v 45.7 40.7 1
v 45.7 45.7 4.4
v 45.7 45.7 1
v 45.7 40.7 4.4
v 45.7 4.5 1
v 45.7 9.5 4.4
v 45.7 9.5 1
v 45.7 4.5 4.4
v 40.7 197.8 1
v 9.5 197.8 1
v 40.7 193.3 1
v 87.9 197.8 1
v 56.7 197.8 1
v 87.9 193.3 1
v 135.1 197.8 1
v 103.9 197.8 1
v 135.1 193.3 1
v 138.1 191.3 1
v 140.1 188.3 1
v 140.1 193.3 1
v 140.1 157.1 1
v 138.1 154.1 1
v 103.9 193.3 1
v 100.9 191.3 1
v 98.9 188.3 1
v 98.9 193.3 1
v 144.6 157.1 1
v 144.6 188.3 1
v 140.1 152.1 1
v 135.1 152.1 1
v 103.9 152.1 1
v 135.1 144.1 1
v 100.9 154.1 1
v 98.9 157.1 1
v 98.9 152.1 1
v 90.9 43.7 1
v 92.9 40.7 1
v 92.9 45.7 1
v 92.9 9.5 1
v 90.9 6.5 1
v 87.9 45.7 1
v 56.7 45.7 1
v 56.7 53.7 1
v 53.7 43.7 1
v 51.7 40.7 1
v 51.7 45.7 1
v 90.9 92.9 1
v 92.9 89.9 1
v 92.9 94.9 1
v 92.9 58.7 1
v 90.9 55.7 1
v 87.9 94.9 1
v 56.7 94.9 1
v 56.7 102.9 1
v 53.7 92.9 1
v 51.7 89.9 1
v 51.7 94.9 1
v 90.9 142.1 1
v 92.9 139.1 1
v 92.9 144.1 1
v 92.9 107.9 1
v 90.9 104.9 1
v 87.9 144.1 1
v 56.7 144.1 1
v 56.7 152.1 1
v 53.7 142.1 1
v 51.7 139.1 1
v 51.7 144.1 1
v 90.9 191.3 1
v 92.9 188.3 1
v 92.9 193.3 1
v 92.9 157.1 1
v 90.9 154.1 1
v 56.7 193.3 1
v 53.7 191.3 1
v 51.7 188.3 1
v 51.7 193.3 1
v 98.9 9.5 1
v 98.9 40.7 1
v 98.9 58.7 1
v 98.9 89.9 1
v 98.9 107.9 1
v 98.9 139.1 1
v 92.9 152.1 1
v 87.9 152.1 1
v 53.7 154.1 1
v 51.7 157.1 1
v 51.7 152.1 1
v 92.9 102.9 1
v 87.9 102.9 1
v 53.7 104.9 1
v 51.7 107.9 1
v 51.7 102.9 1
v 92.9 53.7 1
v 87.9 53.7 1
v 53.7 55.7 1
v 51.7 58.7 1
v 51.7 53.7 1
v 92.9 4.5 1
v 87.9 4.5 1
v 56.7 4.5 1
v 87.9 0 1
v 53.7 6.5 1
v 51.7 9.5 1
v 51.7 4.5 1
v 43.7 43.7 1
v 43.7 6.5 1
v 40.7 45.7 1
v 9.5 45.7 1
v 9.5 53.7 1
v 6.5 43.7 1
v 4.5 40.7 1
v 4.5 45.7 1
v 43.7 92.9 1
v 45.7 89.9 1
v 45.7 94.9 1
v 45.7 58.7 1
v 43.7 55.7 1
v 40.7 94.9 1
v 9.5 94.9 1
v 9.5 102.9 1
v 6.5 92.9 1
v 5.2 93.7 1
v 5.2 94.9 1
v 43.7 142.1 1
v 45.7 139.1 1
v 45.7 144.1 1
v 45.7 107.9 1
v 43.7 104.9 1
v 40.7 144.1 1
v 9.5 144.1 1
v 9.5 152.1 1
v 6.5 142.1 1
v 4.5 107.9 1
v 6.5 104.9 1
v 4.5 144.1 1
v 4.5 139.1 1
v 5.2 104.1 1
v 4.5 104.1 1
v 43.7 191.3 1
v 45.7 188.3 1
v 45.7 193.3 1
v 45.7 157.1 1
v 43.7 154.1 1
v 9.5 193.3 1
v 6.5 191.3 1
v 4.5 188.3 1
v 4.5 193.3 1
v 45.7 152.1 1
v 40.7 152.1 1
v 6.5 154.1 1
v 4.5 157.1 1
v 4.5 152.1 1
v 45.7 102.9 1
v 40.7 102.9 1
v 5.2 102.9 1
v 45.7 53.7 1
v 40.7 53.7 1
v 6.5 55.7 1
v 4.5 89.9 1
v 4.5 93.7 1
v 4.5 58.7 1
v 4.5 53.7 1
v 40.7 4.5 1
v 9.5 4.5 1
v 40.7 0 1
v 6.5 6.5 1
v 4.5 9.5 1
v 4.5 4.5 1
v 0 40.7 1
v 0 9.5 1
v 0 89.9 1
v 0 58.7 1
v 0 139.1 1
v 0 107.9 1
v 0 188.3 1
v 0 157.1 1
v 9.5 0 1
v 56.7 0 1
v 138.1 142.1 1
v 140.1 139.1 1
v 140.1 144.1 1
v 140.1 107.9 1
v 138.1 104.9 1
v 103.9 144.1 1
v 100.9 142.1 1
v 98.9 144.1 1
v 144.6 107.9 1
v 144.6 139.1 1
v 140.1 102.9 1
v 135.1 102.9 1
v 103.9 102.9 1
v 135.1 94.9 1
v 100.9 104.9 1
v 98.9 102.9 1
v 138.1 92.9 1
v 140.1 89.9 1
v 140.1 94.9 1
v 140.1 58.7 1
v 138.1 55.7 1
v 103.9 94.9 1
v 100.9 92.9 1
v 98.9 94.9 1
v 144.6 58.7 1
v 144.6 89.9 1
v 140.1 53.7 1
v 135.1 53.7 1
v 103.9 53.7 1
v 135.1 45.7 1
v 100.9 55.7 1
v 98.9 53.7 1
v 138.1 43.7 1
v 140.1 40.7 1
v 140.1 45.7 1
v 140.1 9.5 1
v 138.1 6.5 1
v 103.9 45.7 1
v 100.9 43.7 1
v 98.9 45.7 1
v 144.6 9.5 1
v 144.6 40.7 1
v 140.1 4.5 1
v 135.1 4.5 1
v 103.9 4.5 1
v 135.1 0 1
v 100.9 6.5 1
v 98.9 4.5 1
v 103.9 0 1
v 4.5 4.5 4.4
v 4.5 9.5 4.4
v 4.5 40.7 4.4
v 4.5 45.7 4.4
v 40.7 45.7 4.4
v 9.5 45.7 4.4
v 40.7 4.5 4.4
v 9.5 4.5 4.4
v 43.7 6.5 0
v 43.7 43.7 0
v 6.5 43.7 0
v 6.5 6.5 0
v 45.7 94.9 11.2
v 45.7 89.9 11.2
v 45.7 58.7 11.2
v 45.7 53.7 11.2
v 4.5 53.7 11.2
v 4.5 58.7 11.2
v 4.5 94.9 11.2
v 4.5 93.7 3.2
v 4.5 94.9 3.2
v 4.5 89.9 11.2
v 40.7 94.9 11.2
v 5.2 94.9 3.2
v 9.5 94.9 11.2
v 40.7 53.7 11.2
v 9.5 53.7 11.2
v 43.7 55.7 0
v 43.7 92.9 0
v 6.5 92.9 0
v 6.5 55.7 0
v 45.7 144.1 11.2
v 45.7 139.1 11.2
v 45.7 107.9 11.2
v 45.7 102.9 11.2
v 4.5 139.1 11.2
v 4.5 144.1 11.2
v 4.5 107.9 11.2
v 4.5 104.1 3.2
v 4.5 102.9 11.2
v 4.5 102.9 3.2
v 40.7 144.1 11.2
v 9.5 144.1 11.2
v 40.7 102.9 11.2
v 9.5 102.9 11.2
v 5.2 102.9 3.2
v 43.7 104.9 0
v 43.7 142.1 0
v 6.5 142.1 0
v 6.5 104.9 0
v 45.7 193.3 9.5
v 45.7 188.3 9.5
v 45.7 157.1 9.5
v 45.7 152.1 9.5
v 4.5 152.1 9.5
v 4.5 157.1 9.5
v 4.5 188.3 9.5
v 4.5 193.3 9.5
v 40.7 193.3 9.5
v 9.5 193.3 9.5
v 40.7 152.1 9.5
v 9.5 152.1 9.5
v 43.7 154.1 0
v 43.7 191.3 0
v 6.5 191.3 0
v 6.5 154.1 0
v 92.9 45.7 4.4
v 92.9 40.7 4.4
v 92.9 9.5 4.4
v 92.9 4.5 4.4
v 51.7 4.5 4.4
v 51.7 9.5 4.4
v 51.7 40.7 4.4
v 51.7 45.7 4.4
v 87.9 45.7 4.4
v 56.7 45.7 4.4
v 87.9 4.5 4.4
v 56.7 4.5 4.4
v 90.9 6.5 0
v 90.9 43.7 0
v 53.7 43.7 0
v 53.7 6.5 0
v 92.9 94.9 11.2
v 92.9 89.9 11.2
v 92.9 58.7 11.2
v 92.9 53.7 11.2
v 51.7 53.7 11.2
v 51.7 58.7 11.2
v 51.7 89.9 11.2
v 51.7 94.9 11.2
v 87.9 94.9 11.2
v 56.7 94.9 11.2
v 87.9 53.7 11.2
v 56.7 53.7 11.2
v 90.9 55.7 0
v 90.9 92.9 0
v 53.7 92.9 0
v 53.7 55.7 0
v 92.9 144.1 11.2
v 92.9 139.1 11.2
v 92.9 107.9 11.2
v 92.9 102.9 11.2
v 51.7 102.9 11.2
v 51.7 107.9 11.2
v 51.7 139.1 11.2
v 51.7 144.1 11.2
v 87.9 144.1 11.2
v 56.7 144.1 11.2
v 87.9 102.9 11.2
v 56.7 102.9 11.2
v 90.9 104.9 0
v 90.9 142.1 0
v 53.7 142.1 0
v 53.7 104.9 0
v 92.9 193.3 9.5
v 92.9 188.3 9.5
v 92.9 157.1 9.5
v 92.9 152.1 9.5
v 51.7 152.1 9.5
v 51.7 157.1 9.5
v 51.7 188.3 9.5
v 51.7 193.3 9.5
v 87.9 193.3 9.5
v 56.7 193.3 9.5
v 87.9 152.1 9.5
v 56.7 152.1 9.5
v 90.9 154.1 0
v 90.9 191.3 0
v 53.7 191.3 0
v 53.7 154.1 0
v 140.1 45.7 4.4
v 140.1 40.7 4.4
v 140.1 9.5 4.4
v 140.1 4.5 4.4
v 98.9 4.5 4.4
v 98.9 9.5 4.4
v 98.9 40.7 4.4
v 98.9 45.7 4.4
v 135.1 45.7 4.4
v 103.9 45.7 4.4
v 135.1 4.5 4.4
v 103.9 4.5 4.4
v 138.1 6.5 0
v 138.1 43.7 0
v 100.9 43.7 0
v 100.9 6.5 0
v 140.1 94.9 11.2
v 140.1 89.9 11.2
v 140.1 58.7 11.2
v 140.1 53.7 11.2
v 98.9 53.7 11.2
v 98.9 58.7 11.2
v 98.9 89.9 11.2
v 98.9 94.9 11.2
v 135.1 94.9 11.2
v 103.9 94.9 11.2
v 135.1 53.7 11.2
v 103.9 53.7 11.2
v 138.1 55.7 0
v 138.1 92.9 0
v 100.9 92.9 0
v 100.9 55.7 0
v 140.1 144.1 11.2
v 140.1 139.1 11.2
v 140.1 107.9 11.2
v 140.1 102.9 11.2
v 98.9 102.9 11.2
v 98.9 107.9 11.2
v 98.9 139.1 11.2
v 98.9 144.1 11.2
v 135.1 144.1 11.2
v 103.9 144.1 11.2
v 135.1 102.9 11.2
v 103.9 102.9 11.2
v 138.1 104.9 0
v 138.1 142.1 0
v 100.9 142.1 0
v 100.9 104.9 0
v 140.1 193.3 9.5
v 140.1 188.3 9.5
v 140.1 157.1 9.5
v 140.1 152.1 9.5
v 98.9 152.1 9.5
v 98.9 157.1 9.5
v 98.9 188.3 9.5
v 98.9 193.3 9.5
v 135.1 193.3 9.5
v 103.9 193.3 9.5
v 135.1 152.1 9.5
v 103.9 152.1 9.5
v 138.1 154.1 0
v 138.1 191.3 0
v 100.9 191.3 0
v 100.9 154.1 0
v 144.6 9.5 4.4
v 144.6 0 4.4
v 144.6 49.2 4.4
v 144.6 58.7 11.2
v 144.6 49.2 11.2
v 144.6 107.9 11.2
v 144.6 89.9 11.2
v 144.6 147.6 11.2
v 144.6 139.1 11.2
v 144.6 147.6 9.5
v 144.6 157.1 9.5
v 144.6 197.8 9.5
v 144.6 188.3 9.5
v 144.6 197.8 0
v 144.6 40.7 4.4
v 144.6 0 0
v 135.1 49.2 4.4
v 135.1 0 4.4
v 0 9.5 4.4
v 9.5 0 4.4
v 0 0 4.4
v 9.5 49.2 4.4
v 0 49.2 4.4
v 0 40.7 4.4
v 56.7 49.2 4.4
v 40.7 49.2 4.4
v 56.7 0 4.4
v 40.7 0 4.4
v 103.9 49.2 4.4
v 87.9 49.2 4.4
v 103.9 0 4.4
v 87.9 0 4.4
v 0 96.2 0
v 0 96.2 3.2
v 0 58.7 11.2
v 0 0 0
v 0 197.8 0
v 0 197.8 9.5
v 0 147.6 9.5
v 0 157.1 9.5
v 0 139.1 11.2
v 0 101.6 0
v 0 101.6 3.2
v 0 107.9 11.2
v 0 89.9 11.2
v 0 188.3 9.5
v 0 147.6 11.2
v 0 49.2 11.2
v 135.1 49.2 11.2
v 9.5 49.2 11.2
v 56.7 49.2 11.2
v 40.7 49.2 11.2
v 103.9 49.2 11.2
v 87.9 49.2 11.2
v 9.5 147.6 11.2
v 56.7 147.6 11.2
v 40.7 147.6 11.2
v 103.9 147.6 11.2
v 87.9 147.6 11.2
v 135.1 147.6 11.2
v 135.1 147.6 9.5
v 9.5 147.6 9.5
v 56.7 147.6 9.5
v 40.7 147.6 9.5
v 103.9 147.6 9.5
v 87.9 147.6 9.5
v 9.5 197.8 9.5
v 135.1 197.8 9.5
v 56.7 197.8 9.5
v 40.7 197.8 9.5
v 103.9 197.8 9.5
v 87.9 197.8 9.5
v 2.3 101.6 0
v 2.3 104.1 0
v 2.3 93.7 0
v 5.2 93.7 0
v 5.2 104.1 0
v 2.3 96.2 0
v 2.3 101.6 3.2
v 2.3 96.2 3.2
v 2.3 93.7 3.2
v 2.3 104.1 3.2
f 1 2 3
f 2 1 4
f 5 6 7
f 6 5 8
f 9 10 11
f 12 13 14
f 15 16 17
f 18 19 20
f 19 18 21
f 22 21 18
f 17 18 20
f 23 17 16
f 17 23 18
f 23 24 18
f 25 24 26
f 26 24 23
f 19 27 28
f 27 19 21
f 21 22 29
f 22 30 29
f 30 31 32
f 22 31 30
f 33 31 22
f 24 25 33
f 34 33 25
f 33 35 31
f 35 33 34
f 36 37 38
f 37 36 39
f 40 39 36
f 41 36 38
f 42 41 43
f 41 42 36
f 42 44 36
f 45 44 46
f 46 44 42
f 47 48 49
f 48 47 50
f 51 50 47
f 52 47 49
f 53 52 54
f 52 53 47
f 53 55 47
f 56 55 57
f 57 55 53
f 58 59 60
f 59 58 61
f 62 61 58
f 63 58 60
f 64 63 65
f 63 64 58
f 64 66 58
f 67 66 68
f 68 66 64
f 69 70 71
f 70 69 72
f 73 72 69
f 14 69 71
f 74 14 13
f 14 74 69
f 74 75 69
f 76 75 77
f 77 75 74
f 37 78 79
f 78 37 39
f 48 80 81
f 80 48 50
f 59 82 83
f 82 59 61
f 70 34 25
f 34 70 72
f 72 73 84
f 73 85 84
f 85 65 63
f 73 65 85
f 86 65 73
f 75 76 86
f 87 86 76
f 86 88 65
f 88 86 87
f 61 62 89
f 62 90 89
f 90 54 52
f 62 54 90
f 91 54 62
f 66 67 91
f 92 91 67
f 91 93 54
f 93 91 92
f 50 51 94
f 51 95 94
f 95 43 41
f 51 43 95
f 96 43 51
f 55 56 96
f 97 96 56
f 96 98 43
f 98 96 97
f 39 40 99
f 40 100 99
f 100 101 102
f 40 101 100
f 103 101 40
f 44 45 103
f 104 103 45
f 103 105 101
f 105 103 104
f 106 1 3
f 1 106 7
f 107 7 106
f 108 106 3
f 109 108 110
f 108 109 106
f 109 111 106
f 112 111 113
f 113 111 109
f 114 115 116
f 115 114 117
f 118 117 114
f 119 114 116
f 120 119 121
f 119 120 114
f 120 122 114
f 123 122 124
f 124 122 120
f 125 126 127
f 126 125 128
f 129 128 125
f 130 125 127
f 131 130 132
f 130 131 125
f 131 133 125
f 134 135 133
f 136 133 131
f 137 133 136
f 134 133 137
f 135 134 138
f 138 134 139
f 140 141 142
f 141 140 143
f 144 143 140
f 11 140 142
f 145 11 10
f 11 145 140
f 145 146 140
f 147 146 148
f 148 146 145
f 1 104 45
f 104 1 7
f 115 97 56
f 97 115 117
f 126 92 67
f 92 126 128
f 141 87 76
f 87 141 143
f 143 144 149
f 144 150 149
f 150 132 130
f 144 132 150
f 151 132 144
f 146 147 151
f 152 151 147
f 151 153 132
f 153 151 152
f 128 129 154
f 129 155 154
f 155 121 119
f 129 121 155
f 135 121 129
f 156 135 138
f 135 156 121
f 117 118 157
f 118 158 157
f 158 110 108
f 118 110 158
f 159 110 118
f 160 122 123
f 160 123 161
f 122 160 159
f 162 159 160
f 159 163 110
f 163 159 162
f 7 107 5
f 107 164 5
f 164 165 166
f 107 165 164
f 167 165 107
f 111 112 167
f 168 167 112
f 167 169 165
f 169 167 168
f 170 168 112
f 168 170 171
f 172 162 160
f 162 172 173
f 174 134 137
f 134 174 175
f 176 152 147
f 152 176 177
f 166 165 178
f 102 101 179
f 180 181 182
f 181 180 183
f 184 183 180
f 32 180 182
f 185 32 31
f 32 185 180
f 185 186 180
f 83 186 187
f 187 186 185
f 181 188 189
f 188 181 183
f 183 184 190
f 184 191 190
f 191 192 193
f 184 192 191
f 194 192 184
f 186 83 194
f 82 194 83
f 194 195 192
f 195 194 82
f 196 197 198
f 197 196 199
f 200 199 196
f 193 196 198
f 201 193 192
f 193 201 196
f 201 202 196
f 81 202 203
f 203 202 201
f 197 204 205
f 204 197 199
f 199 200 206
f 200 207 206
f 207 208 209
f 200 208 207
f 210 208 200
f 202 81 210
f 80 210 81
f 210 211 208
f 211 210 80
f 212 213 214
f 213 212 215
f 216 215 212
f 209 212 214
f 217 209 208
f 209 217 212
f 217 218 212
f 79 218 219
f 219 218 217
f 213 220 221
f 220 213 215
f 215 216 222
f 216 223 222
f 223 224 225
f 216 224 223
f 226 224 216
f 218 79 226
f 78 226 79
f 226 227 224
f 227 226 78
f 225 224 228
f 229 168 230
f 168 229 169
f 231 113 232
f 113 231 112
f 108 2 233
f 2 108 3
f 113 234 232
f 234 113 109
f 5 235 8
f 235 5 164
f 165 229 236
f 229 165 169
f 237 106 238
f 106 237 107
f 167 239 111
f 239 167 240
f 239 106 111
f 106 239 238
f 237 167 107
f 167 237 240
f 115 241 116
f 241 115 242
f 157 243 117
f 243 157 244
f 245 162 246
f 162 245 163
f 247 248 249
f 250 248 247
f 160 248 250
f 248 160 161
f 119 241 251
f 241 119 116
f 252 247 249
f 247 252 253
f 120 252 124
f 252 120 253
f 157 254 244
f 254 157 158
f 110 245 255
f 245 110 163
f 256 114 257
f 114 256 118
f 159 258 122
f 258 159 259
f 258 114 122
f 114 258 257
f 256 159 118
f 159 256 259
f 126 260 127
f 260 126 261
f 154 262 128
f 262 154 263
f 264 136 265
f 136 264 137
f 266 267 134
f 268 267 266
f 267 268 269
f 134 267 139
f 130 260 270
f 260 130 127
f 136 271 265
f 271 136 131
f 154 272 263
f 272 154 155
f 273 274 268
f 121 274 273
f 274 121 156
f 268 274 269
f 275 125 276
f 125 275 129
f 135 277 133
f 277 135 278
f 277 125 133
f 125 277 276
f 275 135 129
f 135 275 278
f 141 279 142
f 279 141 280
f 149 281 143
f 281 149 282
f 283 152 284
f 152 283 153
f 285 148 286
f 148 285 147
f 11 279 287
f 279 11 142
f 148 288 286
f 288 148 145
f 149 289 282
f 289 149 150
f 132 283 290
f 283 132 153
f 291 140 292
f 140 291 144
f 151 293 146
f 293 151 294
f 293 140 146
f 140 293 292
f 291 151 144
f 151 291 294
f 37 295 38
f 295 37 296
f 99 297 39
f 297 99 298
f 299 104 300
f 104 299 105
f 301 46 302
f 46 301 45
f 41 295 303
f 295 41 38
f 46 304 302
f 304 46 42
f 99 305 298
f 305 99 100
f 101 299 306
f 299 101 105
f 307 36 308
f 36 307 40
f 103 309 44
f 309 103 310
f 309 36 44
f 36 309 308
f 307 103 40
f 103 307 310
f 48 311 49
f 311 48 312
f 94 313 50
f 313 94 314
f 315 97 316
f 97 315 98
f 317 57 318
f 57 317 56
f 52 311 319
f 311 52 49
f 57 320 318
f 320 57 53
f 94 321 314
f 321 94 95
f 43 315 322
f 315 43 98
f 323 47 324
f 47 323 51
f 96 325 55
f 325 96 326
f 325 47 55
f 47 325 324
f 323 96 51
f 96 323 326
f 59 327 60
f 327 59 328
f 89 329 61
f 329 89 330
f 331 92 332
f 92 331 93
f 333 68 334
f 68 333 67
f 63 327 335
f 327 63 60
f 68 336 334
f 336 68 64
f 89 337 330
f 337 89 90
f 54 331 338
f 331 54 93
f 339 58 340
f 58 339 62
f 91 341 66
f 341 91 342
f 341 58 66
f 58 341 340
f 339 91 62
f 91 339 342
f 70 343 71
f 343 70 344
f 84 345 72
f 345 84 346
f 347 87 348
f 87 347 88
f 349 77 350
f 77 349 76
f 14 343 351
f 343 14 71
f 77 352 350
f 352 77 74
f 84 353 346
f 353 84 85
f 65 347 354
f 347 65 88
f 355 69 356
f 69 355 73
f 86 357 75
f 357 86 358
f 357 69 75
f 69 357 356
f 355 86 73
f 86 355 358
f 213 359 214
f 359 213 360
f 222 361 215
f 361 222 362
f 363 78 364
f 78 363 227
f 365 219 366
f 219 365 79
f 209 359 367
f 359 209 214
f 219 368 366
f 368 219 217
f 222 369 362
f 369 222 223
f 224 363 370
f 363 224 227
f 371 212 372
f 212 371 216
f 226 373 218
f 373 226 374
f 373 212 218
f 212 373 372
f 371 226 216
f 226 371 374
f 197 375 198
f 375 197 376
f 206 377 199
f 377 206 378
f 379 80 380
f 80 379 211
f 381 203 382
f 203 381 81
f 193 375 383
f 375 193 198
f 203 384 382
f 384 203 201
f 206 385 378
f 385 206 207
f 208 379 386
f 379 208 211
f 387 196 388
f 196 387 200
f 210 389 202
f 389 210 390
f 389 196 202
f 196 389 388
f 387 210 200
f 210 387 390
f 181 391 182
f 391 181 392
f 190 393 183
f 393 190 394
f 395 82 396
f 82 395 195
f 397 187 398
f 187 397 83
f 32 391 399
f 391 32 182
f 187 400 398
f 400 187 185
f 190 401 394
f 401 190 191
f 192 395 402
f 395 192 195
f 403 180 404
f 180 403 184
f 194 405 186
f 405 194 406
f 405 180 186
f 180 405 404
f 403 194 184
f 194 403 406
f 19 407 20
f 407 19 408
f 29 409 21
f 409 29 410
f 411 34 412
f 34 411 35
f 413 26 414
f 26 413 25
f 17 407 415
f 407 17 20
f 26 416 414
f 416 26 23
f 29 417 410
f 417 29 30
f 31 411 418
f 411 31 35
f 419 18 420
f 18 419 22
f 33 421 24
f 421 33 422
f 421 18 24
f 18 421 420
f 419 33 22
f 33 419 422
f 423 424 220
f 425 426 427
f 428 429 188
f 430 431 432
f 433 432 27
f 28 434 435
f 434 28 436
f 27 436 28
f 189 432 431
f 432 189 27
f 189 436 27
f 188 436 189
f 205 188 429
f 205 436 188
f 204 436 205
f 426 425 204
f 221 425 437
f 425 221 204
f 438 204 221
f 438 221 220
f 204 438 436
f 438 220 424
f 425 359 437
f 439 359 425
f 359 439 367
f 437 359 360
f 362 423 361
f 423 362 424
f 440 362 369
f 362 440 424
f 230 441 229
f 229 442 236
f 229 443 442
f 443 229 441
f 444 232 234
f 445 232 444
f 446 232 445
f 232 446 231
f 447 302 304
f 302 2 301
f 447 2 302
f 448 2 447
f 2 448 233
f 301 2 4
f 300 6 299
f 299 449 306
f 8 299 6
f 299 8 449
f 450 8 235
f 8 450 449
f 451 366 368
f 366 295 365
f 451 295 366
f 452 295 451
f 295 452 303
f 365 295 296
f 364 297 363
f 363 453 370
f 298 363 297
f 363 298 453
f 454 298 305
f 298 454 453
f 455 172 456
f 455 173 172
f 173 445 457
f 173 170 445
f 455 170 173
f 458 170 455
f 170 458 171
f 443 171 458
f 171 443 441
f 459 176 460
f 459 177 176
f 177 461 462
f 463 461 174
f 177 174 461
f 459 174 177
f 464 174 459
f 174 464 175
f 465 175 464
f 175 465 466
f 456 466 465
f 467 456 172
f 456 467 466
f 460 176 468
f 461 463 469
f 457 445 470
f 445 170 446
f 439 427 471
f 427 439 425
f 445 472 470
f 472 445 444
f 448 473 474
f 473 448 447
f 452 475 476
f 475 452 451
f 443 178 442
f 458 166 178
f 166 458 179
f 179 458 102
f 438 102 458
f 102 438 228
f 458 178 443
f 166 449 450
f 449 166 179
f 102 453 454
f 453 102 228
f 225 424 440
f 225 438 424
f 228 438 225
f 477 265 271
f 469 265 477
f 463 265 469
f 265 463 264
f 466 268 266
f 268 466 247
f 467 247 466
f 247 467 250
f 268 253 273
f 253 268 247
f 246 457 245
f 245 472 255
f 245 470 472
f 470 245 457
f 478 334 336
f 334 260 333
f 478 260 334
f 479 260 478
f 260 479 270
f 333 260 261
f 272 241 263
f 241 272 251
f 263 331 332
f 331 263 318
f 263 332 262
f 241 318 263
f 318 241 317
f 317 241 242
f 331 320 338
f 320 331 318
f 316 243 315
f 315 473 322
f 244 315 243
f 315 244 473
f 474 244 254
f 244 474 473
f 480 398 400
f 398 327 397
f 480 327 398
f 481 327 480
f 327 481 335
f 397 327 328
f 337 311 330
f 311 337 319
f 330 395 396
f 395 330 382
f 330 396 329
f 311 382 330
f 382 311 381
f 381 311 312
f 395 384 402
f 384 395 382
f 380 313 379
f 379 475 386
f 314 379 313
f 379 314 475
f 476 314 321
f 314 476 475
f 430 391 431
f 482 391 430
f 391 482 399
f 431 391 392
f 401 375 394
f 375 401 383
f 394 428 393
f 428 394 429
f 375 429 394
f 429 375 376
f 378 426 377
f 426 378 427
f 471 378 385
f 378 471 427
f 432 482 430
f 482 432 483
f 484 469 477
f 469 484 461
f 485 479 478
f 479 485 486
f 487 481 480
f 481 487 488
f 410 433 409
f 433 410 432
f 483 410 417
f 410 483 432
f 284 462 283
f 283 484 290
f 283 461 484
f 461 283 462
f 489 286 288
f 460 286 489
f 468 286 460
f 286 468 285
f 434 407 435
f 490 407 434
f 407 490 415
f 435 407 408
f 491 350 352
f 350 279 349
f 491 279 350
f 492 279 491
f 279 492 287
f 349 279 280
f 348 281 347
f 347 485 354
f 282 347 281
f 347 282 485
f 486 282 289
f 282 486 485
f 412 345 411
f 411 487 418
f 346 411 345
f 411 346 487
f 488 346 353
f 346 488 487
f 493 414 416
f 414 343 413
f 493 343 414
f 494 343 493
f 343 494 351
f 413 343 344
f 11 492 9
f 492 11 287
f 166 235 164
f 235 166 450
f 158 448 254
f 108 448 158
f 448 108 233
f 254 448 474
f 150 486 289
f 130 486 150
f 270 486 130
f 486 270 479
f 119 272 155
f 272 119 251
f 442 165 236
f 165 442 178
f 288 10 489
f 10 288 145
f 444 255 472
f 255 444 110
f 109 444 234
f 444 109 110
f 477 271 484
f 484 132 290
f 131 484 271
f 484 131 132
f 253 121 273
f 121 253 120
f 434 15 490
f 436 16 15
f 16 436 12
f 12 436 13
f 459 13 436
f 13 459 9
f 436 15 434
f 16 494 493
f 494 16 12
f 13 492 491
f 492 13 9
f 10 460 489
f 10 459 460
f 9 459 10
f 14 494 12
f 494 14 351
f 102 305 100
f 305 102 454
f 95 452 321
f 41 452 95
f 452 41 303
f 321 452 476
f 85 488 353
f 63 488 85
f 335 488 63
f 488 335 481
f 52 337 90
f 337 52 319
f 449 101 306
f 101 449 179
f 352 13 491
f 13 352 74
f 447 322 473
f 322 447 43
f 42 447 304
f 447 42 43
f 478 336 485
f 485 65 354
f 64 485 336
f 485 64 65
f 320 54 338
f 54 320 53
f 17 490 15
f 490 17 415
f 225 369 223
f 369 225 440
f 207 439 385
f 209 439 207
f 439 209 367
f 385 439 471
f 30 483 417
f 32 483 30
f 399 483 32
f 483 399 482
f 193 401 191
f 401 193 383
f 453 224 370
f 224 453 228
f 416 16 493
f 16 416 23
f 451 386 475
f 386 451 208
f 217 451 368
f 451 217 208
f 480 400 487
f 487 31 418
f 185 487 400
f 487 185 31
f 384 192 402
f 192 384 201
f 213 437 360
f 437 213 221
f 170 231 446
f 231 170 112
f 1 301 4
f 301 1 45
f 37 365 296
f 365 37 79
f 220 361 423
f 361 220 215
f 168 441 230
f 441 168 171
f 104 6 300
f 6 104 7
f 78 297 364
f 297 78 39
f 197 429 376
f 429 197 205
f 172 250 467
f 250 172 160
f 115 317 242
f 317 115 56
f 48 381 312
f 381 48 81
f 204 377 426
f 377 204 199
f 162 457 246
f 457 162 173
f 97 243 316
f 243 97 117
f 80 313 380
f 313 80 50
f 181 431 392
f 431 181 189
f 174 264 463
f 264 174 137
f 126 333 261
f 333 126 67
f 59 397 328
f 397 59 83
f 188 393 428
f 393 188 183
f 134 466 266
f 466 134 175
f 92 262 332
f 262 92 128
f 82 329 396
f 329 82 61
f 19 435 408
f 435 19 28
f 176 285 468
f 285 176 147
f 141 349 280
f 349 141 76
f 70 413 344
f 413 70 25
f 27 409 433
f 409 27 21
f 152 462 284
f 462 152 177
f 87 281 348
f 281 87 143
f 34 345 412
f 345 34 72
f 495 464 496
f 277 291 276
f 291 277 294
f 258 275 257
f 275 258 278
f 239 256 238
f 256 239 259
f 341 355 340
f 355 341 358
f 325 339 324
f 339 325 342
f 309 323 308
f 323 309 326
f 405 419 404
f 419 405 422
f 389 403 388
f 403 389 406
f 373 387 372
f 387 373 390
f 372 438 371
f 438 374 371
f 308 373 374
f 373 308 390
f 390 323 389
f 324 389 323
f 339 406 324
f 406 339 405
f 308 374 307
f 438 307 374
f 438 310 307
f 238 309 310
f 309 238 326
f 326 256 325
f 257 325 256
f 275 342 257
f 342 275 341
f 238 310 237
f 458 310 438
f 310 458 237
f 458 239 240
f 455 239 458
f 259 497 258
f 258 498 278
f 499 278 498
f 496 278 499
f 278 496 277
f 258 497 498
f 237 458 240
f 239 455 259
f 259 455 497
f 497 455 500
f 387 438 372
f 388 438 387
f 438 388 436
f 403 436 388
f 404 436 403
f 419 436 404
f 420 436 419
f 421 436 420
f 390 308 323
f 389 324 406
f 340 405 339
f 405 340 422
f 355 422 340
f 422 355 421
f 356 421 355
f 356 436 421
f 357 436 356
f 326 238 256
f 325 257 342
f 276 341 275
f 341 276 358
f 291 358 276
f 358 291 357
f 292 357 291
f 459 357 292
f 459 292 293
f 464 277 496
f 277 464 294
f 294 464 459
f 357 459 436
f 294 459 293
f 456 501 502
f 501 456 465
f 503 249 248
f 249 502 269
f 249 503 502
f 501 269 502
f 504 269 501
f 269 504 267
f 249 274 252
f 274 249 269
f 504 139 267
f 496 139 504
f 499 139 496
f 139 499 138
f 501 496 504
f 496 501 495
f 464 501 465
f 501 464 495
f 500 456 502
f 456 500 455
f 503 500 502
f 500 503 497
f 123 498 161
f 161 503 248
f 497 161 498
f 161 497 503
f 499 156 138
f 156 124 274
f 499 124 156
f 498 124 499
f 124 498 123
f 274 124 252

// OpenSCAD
// 4x4 tile racks for Anno 1800
// Tiles are 1.7mm thich, 40.2mm square (allocate 41.2mm space)
// 47.2mm horizontal separation
// 49.2mm vertical separation


module cutout(sc,height) {
    x = 2.5;
    linear_extrude(height) 
        offset(delta=sc) polygon([[0,x],[x,x],[x,x*2],[x*2,x*2],[x*2,x*-2],[x,x*-2],[x,-x],[0,-x]]);
}

module annoTray(cols,rows,rowHeights) {
    border = 4.5;
    trayWidth = 47.2*(cols-1)+41.2+border*2;
    trayHeight = 49.2*(rows-1)+41.2+border*2;
    thickness = 1.7 * rowHeights[1];
    
    union () {
        difference() {
            cube([trayWidth,trayHeight,thickness+1]);
            for (i=[0:(cols-1)]) {
                for (j=[0:(rows-1)]) {
                    translate([border+47.2*i,border+49.2*j,1]) {
                        cube([41.2,41.2,99]);
                        translate([2,2,-2]) cube([41.2-4,41.2-4,99]);
                    }
                }
            }
            for (j=[0:(rows-1)]) translate([0,49.2*j,rowHeights[j]*1.7+1]) 
                cube([trayWidth,j==rows-1?49.2+border:49.2,99]);
            for (i=[0:(cols-1)]) translate([border+47.2*i+5,0,1])
                cube([41.2-10,trayHeight,99]);
            for (j=[0:(rows-1)]) translate([0,border+49.2*j+5,1])
                cube([trayWidth,41.2-10,99]);
            translate([0,trayHeight/2,0]) cutout(0.2,3.2);
            /* cylinder(5,r=1,$fn=60); */
        }
        if (cols==4) translate([trayWidth,trayHeight/2,0]) cutout(0,3);
    }
}

//annoTray(4,4,[2,2,2,2]);
//translate([200,0,0]) 
annoTray(3,4,[2,6,6,5]);
